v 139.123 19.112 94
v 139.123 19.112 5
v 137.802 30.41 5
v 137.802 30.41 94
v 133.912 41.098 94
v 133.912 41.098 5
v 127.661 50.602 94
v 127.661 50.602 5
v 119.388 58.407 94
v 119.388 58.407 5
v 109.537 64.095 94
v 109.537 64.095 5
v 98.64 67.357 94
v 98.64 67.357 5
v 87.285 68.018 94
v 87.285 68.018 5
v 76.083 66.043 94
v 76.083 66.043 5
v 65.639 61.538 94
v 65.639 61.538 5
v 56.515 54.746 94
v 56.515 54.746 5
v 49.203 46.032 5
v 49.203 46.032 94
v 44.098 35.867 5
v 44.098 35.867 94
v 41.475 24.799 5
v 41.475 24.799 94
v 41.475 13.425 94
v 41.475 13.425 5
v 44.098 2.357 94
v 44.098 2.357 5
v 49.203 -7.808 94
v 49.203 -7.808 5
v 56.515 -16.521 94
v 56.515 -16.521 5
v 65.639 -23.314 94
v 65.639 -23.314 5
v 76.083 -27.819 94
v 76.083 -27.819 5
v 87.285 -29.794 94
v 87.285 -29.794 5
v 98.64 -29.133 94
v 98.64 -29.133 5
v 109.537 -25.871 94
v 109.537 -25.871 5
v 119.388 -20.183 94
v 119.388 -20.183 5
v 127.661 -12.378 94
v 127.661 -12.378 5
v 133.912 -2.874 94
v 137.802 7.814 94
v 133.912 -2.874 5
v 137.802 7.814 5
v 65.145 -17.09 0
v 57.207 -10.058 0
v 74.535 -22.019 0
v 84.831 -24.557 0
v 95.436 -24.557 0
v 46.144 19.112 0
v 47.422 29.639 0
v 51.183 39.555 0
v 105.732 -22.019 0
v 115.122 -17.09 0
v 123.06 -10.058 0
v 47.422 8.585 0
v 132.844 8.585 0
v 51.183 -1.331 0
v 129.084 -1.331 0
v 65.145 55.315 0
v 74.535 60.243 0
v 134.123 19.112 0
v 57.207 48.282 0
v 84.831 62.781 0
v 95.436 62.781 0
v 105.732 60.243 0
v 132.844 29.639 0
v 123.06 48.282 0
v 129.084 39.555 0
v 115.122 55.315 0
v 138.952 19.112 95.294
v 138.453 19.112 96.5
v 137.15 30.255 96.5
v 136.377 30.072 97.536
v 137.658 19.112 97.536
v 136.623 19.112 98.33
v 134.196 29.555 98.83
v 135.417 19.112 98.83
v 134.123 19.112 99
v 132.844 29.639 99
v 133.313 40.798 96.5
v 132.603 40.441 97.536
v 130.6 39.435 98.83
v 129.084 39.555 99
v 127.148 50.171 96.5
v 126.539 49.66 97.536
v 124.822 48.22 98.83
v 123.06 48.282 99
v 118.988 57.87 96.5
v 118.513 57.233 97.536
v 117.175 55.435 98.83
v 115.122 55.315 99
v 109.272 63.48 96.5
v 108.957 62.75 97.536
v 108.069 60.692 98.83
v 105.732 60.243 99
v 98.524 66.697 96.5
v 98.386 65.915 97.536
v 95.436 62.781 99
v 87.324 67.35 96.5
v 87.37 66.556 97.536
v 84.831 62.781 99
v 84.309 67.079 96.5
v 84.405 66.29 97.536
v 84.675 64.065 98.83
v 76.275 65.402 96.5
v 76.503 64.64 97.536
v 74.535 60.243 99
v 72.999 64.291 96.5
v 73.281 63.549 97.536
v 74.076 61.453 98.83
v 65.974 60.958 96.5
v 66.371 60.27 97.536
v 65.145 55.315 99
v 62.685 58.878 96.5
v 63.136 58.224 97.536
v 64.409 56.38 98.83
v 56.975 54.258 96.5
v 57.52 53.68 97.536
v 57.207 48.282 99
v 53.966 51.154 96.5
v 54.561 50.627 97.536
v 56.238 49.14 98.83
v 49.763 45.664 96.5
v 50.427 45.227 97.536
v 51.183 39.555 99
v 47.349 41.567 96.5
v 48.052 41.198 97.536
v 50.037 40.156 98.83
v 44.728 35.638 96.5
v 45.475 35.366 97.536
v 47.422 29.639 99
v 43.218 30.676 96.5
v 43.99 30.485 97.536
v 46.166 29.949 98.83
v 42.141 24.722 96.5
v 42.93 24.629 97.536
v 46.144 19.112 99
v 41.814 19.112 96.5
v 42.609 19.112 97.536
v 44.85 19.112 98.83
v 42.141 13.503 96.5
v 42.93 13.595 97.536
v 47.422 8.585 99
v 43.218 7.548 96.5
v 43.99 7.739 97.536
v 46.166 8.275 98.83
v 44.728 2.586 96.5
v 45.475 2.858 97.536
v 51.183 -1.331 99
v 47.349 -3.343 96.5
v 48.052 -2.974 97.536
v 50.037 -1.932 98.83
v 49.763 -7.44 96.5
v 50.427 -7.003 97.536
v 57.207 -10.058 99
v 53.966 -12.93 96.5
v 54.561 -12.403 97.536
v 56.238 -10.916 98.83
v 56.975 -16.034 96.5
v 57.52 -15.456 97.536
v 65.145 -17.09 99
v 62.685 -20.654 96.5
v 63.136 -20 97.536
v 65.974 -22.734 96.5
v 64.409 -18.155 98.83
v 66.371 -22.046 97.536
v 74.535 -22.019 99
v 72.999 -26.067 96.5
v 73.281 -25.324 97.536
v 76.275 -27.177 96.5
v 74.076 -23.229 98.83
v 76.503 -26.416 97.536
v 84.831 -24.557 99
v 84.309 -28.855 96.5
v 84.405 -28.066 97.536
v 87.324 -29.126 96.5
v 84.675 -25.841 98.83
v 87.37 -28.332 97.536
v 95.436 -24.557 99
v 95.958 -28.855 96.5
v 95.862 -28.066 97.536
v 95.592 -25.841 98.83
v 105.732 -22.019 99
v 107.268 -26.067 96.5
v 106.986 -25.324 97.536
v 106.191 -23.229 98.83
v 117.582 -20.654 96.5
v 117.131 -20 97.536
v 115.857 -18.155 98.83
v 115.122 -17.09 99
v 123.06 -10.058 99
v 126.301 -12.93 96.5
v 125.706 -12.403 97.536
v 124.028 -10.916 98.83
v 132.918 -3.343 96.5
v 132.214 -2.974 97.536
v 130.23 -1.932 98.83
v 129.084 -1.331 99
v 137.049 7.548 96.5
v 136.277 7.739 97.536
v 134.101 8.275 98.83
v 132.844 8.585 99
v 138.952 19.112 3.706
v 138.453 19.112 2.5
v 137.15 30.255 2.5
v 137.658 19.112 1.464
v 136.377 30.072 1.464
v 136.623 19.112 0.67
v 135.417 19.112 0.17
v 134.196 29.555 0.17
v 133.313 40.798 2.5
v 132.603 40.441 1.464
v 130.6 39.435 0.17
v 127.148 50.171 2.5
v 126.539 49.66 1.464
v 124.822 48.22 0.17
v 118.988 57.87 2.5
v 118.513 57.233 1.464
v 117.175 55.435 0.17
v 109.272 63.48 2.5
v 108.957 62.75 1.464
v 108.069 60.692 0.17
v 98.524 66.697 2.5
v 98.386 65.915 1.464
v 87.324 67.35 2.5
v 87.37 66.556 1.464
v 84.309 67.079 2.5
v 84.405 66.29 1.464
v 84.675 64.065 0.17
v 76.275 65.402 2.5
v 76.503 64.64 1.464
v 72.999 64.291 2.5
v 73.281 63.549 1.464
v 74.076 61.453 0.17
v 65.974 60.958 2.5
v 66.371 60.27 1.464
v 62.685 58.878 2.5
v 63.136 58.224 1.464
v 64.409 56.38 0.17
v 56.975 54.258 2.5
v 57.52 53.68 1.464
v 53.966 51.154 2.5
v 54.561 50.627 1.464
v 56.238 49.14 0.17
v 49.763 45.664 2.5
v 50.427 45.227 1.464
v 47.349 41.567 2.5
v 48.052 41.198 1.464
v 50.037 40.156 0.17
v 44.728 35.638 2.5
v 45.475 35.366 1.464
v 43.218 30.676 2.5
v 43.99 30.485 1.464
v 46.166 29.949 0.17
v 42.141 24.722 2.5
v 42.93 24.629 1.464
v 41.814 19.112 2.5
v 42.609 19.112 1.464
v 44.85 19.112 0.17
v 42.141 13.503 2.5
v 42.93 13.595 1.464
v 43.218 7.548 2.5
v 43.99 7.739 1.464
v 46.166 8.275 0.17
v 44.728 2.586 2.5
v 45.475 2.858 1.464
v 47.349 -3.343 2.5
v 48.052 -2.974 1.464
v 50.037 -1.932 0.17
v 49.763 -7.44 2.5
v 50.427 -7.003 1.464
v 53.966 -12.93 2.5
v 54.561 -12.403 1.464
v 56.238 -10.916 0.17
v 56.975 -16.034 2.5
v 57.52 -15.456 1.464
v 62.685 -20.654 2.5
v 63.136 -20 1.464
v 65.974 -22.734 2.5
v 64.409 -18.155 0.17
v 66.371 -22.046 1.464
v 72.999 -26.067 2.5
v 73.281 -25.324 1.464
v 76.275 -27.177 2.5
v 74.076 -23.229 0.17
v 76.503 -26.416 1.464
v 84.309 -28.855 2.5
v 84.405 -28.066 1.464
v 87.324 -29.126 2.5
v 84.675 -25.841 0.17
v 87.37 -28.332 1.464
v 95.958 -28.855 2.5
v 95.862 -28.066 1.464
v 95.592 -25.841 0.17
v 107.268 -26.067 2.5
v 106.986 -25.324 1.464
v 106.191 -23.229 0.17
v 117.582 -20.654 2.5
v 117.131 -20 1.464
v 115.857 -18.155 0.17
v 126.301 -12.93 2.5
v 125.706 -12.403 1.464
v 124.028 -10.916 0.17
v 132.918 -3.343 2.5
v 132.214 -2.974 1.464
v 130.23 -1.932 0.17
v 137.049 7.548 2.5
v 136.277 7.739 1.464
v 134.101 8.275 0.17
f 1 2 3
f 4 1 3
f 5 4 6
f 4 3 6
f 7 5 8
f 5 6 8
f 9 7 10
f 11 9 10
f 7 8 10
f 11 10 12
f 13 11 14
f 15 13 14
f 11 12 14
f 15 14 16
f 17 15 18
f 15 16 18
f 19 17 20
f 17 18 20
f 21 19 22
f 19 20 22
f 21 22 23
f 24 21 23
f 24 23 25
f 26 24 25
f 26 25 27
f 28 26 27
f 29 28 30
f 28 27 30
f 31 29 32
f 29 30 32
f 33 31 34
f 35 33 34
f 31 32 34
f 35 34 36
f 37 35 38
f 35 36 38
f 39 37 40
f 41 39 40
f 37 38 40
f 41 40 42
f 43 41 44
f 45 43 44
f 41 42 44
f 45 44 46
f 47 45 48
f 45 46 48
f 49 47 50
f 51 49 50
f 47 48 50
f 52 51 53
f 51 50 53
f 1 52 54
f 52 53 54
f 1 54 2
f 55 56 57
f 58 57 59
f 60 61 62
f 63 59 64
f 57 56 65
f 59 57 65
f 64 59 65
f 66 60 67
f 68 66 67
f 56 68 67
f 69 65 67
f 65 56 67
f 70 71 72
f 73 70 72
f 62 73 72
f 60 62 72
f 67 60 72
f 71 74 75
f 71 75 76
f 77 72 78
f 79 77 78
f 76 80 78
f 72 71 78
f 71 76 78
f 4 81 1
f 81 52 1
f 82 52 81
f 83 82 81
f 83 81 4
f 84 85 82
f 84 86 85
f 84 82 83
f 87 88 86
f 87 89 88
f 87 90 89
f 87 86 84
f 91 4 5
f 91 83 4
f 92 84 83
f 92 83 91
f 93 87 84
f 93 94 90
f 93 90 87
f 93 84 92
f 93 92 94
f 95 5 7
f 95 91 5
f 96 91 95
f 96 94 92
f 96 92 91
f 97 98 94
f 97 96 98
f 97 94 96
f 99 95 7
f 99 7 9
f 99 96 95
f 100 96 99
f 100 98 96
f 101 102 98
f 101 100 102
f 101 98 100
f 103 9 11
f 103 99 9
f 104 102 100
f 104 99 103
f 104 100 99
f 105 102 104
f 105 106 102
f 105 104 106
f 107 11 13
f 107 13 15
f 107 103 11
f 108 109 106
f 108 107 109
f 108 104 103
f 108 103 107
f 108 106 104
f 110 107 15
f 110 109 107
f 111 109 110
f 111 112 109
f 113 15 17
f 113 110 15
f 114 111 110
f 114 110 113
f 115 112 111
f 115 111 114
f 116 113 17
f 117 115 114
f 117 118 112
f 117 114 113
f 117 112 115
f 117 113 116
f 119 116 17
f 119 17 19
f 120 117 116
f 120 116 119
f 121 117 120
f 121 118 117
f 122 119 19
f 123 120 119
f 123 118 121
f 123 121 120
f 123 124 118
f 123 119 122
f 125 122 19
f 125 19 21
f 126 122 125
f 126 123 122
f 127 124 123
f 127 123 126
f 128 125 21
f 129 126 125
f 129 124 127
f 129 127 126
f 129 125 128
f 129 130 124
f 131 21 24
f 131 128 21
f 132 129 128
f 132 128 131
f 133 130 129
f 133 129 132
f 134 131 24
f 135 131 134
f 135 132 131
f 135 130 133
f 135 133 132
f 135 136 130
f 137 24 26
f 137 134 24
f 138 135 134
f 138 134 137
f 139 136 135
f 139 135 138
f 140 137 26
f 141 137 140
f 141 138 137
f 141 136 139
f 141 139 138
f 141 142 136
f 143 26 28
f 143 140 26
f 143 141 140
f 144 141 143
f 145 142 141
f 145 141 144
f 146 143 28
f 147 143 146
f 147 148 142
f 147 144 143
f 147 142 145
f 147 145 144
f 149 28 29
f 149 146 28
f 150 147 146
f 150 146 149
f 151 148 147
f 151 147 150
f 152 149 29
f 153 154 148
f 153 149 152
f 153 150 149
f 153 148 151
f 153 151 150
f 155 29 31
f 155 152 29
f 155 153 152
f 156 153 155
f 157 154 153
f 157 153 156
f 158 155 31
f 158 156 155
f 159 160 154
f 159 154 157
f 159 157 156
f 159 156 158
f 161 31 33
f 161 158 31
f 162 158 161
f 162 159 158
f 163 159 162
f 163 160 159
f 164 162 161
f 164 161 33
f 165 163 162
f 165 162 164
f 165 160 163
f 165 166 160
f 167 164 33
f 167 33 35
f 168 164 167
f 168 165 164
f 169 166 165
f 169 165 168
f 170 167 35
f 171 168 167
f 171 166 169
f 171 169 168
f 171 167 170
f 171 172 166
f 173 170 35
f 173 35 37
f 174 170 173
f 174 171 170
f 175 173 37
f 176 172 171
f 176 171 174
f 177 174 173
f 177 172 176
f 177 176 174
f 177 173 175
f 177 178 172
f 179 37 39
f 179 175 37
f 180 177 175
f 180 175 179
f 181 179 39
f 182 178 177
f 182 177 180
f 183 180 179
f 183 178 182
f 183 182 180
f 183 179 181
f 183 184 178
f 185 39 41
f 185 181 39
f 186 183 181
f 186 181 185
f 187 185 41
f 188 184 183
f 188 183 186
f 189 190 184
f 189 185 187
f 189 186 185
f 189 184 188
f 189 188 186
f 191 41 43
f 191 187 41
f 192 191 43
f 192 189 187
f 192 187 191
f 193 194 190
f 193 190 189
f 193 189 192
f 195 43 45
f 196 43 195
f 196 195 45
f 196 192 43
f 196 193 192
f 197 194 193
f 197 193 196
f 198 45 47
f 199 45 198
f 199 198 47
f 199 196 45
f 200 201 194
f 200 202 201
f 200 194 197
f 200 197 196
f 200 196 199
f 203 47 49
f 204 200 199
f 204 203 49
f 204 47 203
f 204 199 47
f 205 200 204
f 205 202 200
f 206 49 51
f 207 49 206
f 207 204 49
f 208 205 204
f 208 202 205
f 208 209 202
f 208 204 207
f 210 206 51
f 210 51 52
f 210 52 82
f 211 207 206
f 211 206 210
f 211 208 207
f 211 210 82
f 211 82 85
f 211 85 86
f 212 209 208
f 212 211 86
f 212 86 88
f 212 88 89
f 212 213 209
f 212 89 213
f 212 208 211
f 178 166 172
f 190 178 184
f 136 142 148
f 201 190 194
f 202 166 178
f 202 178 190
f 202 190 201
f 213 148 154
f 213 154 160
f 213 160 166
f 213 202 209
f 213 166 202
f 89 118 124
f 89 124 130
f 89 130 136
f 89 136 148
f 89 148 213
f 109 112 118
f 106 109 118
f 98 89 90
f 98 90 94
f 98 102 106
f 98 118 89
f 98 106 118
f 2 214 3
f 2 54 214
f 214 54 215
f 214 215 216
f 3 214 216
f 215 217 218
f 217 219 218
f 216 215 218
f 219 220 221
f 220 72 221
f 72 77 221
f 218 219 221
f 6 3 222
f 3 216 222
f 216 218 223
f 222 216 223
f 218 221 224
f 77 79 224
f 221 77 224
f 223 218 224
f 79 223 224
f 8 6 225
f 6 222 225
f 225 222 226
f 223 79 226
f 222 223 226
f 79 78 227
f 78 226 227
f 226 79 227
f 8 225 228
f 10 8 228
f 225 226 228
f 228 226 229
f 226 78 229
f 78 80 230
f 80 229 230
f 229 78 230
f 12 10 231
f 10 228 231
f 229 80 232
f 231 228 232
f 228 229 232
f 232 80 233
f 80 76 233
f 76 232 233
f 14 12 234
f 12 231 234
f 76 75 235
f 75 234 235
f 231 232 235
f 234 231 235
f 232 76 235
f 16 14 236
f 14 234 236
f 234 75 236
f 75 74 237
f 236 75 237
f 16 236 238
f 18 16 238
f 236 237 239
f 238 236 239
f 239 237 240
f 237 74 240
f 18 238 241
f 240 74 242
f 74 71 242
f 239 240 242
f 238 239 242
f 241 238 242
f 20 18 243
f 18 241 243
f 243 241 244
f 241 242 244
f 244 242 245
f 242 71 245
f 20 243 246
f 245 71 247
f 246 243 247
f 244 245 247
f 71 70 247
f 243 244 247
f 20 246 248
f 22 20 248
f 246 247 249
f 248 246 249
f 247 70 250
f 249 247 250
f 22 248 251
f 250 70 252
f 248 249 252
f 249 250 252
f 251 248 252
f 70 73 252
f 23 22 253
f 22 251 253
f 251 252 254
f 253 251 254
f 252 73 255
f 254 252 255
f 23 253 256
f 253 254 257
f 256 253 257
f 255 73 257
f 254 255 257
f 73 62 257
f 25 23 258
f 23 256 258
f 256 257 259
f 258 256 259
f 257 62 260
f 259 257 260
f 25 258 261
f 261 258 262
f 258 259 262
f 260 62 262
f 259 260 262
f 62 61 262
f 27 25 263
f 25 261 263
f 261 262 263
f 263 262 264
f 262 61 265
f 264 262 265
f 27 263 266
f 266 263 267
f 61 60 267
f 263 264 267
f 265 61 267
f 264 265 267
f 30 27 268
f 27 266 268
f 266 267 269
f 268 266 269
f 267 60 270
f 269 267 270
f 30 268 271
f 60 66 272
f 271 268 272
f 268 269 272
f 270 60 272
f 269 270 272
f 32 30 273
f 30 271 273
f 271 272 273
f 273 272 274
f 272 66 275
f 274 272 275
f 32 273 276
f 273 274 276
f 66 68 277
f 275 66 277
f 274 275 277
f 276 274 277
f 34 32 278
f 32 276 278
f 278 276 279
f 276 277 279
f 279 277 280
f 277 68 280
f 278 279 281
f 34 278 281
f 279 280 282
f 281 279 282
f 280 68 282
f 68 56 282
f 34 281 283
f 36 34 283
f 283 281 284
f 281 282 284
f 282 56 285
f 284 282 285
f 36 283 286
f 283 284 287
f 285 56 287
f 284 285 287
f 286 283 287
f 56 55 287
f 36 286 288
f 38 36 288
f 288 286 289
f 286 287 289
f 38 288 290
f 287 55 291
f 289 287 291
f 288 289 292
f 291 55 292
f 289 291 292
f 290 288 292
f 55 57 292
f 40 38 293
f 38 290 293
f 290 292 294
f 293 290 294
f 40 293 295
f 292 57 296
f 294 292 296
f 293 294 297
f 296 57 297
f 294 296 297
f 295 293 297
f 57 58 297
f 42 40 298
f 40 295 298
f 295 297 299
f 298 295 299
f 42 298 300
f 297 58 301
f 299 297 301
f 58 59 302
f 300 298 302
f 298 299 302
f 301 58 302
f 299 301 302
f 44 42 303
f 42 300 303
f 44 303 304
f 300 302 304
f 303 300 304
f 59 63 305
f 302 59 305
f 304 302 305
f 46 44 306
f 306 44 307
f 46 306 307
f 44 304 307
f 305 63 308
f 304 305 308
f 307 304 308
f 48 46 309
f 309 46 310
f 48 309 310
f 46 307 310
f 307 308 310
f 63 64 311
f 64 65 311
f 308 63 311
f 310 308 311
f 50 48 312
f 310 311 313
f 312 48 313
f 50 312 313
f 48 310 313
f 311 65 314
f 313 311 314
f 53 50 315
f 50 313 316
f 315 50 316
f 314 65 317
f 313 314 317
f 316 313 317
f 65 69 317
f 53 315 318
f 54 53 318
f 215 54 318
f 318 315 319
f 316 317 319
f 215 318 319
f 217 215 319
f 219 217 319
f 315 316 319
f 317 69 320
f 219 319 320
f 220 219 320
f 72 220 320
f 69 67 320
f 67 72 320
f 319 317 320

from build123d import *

# Parameters (mm, degrees)
F0_R     = 48.989285
F1_DEPTH = 99
F2_R     = 5
F3_R     = 5


with BuildPart() as f1:
    # F0 (on Top) → F1 (new body)
    with BuildSketch(Plane.XY):
        with Locations((90.133347, 19.112047)):
            Circle(F0_R)
    extrude(amount=F1_DEPTH)

    # F2
    f2_edges = [f1.edges().sort_by_distance(p)[0] for p in [
        (41.144062, 19.112047, 0),
    ]]
    fillet(f2_edges, radius=F2_R)

    # F3
    f3_edges = [f1.edges().sort_by_distance(p)[0] for p in [
        (41.144062, 19.112047, 99),
    ]]
    fillet(f3_edges, radius=F3_R)


solid = f1.part
